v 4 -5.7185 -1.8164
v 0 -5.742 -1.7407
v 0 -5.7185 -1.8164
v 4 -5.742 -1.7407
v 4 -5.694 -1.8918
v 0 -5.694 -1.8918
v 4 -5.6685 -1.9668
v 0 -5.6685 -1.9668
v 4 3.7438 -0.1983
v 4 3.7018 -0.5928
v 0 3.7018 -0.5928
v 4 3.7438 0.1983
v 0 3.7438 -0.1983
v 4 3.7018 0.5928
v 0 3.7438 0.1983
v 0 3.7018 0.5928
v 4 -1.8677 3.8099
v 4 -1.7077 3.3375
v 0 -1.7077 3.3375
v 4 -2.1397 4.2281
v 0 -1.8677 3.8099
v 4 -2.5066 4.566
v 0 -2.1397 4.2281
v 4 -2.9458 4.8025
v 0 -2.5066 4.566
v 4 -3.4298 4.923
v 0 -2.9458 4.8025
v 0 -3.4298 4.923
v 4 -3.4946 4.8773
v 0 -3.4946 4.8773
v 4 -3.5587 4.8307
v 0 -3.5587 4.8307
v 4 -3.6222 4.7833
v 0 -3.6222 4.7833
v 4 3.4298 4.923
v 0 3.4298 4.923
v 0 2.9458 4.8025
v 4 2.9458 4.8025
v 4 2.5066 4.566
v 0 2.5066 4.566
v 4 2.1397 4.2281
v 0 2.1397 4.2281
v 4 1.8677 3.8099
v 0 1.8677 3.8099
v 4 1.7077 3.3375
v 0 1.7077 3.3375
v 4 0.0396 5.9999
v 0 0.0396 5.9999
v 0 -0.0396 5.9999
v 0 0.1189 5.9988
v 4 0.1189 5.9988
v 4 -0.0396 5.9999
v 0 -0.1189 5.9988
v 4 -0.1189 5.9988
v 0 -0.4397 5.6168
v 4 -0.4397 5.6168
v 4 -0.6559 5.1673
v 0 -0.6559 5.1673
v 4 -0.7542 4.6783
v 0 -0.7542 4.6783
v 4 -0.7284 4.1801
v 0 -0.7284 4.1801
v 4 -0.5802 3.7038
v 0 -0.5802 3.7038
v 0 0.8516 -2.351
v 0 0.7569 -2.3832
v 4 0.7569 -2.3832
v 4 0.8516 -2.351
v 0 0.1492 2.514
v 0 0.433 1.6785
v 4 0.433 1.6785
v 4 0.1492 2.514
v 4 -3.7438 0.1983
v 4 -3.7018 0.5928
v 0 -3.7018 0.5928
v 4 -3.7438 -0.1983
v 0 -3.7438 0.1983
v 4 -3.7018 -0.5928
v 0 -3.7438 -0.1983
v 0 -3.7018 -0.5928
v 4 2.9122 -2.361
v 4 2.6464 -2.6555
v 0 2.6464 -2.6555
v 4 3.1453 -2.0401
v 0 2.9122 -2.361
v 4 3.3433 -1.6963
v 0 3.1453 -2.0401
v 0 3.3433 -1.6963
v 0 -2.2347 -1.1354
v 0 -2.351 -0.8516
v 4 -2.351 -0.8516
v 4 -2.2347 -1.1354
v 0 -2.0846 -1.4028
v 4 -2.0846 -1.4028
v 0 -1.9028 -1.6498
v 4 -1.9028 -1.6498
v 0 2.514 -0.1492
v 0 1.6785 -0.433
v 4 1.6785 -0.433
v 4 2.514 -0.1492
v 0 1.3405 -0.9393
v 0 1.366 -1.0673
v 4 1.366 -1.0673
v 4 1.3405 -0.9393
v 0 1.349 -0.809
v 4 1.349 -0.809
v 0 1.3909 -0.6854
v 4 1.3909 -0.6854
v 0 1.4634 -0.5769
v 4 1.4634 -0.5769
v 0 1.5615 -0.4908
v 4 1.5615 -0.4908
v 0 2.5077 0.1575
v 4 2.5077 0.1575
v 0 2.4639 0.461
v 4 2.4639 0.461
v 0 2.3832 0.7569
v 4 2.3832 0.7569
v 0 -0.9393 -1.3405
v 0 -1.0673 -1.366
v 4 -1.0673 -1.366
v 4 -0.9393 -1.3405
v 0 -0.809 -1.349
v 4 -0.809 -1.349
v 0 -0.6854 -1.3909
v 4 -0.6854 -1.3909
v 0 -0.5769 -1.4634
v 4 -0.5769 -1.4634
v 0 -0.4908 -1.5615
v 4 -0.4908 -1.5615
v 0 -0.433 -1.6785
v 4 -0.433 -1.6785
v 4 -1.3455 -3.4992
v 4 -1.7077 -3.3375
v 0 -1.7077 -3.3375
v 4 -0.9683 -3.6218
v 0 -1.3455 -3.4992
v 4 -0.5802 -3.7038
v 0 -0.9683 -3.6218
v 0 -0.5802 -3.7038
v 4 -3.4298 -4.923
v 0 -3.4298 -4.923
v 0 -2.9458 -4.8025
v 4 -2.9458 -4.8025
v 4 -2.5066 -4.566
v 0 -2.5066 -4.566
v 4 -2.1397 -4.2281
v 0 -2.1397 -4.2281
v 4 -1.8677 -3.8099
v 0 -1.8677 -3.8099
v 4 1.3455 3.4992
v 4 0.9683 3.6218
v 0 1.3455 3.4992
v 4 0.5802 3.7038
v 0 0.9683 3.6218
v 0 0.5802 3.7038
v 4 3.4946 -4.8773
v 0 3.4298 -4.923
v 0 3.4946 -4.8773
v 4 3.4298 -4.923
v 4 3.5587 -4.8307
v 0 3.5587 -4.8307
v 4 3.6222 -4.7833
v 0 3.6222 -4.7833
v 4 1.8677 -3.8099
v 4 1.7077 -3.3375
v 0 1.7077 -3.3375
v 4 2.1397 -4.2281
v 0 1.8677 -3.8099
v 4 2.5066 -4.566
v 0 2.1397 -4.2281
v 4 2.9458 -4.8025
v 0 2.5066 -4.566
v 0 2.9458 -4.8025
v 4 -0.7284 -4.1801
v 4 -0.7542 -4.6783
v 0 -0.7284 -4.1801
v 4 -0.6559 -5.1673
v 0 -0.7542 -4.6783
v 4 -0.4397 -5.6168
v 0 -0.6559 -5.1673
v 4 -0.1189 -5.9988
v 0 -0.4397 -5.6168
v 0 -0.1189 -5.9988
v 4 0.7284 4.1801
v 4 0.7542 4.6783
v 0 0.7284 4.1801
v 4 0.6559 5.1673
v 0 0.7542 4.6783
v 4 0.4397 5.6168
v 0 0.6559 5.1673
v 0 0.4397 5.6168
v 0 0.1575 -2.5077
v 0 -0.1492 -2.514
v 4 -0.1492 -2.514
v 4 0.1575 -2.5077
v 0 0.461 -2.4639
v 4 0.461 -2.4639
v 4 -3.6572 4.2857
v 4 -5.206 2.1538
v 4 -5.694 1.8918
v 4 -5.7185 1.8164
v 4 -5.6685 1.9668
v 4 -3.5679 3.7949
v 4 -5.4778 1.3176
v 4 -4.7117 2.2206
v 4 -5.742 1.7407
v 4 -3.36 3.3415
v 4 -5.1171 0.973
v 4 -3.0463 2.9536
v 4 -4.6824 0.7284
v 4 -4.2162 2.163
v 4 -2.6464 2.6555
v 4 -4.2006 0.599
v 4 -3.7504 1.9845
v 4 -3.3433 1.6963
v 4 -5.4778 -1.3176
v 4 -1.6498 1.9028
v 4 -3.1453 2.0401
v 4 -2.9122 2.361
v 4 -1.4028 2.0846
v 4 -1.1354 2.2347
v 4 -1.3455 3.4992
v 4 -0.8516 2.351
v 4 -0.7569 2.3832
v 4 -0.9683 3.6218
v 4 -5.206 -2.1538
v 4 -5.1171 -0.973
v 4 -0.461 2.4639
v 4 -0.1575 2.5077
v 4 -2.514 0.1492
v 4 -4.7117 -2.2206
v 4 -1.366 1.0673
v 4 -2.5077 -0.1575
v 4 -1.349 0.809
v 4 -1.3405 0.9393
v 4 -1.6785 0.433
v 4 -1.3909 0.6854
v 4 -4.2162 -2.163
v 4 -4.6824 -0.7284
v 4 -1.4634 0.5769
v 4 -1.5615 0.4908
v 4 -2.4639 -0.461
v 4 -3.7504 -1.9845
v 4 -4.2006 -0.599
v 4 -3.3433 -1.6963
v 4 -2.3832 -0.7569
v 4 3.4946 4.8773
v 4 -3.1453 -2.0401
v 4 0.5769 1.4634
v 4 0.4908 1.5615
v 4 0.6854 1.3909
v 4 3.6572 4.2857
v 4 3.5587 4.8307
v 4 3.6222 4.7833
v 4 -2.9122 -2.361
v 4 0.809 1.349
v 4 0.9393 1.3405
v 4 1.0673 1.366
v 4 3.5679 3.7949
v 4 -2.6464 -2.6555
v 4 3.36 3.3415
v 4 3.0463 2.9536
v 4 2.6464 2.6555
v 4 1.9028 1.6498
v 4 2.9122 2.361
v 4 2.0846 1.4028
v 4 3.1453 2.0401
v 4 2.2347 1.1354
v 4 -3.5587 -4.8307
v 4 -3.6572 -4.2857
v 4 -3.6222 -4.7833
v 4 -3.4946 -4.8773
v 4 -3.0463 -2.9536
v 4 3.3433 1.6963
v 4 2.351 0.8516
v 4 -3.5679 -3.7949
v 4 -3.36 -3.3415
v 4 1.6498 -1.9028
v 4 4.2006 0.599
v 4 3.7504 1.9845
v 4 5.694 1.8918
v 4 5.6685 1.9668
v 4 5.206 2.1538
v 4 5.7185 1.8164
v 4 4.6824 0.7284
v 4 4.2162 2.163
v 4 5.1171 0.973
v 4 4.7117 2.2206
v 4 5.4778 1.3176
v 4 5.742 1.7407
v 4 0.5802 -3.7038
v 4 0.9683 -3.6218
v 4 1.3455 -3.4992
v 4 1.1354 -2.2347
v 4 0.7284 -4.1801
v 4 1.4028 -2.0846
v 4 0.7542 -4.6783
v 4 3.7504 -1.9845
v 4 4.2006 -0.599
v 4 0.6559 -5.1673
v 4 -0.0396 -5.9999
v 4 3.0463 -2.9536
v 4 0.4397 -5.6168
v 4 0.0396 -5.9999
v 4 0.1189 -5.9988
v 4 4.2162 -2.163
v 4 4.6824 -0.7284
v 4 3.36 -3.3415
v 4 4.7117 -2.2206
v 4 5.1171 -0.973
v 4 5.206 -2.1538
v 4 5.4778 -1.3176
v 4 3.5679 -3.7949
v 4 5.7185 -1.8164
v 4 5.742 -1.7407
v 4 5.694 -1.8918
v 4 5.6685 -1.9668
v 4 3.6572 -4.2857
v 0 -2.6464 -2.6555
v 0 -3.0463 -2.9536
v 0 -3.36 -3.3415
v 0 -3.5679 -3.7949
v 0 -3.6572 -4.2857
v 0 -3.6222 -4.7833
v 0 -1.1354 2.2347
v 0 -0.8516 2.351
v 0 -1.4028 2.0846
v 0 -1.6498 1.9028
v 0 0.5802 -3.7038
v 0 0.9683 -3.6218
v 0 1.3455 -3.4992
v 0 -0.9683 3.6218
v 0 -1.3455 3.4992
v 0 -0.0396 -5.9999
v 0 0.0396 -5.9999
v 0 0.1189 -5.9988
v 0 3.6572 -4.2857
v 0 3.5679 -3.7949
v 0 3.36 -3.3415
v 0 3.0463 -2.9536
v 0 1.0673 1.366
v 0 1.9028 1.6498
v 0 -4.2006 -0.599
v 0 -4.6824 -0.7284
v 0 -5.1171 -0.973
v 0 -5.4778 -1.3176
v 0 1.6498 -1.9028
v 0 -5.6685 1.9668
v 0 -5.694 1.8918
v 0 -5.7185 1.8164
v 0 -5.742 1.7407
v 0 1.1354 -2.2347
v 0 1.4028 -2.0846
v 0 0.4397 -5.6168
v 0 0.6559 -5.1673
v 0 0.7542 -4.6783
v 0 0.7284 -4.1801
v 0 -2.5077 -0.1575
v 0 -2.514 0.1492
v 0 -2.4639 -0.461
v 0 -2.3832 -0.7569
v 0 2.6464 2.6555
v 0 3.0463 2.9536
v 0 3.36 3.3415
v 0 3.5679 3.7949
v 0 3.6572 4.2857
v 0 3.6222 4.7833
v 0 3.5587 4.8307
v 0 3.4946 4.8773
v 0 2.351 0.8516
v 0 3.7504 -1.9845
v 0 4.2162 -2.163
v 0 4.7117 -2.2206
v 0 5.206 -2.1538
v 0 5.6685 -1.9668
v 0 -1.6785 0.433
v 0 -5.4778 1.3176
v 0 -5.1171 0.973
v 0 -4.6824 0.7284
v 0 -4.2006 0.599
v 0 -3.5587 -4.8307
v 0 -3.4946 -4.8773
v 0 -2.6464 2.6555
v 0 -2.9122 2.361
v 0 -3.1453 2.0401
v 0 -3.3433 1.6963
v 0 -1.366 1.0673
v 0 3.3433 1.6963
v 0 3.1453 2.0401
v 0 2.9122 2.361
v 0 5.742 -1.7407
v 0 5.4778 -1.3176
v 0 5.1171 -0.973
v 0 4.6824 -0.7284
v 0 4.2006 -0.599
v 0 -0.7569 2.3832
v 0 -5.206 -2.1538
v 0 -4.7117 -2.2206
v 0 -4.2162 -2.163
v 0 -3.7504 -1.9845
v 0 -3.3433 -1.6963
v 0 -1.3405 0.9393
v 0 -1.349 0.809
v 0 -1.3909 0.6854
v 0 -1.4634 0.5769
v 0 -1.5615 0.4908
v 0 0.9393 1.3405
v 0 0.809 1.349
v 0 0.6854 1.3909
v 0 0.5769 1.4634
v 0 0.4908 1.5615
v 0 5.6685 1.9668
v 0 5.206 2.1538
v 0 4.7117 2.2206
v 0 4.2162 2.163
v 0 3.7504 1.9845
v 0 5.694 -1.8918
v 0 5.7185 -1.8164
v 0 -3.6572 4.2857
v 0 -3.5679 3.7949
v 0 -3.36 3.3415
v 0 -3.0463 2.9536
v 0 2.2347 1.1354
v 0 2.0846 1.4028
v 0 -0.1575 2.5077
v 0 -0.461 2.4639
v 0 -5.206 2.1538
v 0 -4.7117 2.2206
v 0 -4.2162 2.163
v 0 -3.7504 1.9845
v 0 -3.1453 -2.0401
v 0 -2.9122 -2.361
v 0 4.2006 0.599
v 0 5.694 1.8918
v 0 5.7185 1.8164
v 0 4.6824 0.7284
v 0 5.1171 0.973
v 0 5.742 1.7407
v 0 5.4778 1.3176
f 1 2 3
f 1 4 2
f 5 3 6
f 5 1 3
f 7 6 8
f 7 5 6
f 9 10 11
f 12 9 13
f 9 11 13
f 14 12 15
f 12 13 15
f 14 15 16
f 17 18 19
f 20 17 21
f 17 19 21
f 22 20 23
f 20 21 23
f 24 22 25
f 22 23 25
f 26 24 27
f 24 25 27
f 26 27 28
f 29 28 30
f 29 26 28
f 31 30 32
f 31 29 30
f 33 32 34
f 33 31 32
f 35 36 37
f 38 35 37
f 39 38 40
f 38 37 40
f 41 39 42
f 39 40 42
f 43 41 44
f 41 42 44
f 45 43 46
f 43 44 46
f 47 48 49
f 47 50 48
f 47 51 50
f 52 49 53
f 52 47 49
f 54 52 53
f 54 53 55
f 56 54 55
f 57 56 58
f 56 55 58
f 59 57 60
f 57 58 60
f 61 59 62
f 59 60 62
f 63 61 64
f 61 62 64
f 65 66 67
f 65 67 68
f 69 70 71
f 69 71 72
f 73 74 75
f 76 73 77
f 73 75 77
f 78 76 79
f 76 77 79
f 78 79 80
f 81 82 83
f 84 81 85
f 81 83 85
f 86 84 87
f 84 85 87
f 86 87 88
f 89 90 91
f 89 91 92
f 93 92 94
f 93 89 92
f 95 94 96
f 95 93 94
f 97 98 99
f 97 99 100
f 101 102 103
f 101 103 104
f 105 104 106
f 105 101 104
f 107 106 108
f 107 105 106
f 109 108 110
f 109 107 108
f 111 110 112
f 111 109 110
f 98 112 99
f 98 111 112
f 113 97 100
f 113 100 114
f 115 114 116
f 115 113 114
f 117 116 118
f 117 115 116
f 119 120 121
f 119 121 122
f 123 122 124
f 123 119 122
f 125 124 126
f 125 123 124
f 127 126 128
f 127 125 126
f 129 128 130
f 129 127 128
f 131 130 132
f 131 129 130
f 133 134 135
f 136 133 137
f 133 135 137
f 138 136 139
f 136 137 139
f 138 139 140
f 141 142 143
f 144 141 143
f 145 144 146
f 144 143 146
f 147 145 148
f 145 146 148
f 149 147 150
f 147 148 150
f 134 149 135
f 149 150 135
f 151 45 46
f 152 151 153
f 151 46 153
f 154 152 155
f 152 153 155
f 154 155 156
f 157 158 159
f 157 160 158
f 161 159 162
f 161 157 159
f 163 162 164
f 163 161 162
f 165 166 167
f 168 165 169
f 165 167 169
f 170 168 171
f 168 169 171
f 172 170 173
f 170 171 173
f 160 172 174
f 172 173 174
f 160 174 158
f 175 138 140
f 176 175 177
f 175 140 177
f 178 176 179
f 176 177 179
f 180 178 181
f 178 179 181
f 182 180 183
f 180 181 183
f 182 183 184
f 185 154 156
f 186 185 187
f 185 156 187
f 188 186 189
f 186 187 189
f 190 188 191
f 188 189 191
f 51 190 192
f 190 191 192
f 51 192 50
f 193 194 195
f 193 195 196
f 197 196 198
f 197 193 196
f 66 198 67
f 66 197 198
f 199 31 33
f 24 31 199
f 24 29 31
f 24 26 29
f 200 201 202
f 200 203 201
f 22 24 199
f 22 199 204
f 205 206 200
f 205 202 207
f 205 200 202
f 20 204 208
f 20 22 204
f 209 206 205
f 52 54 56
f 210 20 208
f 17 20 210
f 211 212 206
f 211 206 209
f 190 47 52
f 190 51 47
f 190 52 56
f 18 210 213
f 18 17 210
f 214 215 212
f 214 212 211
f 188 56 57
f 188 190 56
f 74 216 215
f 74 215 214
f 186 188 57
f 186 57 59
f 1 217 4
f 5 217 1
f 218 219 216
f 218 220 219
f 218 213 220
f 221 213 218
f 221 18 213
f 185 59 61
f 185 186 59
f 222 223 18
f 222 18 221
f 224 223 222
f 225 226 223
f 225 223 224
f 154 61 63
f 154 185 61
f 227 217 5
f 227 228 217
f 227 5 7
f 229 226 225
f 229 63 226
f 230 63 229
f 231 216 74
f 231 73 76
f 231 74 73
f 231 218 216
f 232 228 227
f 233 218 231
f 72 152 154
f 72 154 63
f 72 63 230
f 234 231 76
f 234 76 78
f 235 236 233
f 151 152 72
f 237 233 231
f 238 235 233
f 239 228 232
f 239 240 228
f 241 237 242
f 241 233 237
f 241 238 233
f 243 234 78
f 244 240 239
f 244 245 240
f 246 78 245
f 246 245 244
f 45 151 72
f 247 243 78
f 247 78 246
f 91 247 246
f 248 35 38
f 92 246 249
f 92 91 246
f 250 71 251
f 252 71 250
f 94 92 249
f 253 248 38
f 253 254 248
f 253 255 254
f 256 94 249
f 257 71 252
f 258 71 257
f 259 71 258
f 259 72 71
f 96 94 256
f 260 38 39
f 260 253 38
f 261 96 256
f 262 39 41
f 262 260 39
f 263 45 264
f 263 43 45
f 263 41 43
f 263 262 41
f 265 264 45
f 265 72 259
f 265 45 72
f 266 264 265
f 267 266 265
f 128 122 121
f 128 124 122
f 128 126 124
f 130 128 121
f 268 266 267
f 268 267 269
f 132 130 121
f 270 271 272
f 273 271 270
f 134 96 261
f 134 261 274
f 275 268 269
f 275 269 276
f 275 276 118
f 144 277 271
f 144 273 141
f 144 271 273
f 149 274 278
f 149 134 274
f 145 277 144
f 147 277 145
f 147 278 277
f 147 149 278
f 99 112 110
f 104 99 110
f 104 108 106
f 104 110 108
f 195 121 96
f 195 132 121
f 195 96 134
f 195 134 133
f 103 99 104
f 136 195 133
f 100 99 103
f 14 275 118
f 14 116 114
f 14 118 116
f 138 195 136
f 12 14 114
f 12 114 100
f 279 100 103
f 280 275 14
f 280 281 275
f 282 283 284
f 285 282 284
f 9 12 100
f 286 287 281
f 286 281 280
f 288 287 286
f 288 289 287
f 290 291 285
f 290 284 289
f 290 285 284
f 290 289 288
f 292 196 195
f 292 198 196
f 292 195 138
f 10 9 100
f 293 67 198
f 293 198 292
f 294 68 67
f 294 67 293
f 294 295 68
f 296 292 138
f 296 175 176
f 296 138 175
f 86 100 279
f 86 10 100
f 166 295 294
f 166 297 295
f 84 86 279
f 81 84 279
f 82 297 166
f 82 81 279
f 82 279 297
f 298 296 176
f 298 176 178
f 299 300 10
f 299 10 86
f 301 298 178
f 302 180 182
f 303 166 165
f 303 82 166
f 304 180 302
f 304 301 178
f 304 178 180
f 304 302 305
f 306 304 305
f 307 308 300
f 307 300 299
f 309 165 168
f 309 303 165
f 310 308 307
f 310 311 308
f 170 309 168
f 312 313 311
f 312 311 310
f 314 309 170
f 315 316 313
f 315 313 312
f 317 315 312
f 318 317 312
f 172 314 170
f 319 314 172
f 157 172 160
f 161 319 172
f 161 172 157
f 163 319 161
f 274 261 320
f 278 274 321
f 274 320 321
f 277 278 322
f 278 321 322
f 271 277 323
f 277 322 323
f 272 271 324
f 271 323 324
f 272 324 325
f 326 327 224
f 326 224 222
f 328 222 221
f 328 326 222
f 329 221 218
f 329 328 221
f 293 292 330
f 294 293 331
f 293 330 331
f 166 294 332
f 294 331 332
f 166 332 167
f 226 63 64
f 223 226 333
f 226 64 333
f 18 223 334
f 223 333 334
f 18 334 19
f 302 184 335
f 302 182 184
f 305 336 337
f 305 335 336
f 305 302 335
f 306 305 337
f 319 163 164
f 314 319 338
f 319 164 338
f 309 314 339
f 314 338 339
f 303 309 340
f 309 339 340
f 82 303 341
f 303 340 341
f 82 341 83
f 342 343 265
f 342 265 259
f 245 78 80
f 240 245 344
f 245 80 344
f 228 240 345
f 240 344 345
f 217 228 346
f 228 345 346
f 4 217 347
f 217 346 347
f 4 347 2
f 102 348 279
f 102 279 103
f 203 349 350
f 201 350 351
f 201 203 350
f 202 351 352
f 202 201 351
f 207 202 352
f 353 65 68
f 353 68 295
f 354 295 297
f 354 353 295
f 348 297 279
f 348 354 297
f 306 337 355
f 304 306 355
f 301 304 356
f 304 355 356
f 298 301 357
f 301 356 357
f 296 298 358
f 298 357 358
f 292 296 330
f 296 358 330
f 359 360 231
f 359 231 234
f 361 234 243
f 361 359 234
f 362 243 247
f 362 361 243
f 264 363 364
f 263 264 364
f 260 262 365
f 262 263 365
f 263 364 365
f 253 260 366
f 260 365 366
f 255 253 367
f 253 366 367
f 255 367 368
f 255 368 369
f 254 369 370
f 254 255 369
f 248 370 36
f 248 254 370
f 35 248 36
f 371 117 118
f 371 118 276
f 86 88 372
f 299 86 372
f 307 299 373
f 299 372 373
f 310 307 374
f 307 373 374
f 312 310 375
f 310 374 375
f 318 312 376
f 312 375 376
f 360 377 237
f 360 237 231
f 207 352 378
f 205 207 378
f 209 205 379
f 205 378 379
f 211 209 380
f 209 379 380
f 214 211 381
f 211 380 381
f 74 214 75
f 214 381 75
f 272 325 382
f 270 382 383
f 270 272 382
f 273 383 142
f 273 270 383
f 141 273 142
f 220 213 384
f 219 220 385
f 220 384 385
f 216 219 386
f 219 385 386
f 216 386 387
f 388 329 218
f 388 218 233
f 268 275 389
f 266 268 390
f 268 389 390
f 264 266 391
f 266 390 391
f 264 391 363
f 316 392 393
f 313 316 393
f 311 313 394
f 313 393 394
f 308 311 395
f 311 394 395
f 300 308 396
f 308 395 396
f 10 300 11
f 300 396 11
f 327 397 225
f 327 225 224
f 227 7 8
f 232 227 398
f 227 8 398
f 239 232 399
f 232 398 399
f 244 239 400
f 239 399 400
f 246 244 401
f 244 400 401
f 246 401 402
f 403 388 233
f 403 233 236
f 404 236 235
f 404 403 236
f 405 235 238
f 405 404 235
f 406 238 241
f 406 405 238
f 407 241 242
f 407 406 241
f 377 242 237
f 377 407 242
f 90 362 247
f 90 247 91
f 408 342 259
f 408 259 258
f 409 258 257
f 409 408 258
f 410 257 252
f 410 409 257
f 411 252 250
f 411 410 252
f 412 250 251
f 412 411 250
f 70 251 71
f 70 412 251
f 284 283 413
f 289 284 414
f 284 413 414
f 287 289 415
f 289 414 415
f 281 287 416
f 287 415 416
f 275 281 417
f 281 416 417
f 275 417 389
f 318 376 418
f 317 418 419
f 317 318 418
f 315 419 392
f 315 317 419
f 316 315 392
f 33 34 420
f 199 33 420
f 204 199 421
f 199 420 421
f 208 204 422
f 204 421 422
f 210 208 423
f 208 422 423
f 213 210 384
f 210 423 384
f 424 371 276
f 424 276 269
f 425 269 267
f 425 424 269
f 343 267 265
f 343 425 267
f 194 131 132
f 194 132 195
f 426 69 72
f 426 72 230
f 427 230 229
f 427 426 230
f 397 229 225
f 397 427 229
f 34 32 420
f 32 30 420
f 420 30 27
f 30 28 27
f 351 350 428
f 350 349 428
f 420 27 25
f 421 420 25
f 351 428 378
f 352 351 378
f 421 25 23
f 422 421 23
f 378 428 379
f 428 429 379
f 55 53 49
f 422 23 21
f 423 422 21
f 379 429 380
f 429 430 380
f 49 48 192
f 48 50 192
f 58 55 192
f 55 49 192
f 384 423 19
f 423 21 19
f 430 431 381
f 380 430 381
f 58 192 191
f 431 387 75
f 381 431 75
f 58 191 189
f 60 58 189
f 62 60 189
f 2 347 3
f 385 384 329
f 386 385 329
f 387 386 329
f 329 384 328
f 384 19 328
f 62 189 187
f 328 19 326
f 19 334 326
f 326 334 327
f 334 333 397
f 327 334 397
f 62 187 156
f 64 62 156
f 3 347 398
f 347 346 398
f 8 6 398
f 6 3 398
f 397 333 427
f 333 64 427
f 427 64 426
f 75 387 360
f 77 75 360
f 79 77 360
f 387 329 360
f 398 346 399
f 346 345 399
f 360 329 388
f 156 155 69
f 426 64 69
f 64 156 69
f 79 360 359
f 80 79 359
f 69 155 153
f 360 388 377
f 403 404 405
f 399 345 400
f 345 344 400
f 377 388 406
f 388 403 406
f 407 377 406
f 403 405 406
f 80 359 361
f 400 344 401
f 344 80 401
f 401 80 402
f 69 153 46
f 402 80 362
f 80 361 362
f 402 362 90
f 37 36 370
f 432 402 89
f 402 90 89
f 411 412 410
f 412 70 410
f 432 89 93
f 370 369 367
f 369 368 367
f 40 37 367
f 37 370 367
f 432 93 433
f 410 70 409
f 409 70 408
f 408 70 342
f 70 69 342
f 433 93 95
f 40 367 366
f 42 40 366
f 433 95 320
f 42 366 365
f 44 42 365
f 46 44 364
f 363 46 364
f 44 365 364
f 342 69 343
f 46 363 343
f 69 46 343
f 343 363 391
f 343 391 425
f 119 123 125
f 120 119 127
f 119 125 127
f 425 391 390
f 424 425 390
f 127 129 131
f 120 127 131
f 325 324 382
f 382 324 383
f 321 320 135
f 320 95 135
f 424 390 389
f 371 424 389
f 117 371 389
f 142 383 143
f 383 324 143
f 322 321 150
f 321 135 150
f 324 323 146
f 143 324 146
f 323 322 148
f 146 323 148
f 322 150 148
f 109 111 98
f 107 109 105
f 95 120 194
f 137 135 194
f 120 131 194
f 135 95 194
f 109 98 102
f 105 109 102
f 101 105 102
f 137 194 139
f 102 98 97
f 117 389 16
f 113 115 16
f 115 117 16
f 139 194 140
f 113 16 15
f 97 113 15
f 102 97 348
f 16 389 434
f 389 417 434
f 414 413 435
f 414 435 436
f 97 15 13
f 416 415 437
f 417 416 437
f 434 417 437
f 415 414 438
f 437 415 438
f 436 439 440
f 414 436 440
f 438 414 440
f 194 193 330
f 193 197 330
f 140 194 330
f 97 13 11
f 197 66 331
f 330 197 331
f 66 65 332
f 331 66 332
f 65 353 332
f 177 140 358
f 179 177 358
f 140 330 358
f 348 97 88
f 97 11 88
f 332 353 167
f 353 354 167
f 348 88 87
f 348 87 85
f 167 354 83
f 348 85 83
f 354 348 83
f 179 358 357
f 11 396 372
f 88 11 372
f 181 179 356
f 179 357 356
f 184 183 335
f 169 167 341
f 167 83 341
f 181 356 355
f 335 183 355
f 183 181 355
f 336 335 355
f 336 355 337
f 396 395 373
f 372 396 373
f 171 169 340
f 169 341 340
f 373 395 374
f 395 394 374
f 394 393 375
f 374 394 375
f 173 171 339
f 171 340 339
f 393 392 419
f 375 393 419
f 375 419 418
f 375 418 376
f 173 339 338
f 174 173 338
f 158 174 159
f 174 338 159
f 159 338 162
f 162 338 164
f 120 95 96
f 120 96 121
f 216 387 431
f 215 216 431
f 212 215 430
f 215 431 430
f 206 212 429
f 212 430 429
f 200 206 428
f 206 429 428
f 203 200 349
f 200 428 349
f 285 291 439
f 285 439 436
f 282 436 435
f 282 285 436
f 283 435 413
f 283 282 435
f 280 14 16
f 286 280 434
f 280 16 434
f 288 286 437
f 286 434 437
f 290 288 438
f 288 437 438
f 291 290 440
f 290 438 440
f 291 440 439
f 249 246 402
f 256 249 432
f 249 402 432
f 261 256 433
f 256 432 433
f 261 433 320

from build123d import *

# Parameters (mm, degrees)
BASPROSKE_W         = 4
BASPROSKE_H         = 6
TOOTHCUT_DEPTH      = 10.38083152
TEETHCUTS_COUNT     = 10
TEETHCUTS_ANGLE     = 324
BORSKE_R            = 2.5
BORE_DEPTH          = 50.0000508
SKETCH2_R           = 3
CUT_EXTRUDE1_DEPTH  = 10.217922092
BOSS_EXTRUDE1_START = -4
SKETCH1_R           = 3
BOSS_EXTRUDE1_DEPTH = 4


with BuildPart() as part:
    # BasProSke → Base-Revolve (revolve)
    with BuildSketch(Plane(origin=(0, 0, 0), x_dir=(1, 0, 0), z_dir=(0, 1, 0)), mode=Mode.PRIVATE) as base_revolve_sk:
        with Locations((2, 3)):
            Rectangle(BASPROSKE_W, BASPROSKE_H)
    revolve(base_revolve_sk.sketch.rotate(Axis((-10, 0, 0), (1, 0, 0)), 180), axis=Axis((-10, 0, 0), (1, 0, 0)))

    # TooCutSke → ToothCut (cut, through all)
    with BuildSketch(Plane(origin=(0, 0, 0), x_dir=(0, 0, -1), z_dir=(1, 0, 0))):
        with BuildLine():
            ThreePointArc((0.59278292, 3.701838653), (0, 3.749), (-0.59278292, 3.701838653))
            ThreePointArc((-0.59278292, 3.701838653), (-0.846593509, 4.924114224), (-1.775771316, 5.757784417))
            ThreePointArc((-1.775771316, 5.757784417), (0, 6.0254), (1.775771316, 5.757784417))
            ThreePointArc((1.775771316, 5.757784417), (0.846593509, 4.924114224), (0.59278292, 3.701838653))
        make_face()
    toothcut = extrude(amount=TOOTHCUT_DEPTH, mode=Mode.SUBTRACT)

    # TeethCuts: ToothCut ×10 about axis
    teethcuts_axis = Axis((-10, 0, 0), (1, 0, 0))
    for i in range(1, TEETHCUTS_COUNT):
        add(toothcut.rotate(teethcuts_axis, i * TEETHCUTS_ANGLE / (TEETHCUTS_COUNT - 1)), mode=Mode.SUBTRACT)

    # BorSke → Bore (cut, symmetric)
    with BuildSketch(Plane(origin=(0, 0, 0), x_dir=(0, 0, -1), z_dir=(1, 0, 0))):
        with Locations(Location((0, 0, 0), (0, 0, 180))):
            Circle(BORSKE_R)
    extrude(amount=BORE_DEPTH, both=True, mode=Mode.SUBTRACT)

    # Sketch2 → Cut-Extrude1 (cut, through all)
    with BuildSketch(Plane.ZY):
        Circle(SKETCH2_R)
    extrude(amount=-CUT_EXTRUDE1_DEPTH, mode=Mode.SUBTRACT)

    # Sketch1 → Boss-Extrude1 (add)
    with BuildSketch(Plane(origin=(4, 0, 0), x_dir=(0, 0, -1), z_dir=(1, 0, 0)).offset(BOSS_EXTRUDE1_START)):
        Circle(SKETCH1_R)
        with BuildLine():
            Line((-0.433026392, -1.678537501), (-0.149160433, -2.514010972))
            ThreePointArc((-0.149160433, -2.514010972), (0.309918975, -2.490426475), (0.756919525, -2.383185438))
            Line((0.756919525, -2.383185438), (0.851603533, -2.351014977))
            ThreePointArc((0.851603533, -2.351014977), (1.271412306, -2.163743179), (1.649835725, -1.902772209))
            Line((1.649835725, -1.902772209), (1.365969766, -1.067298739))
            ThreePointArc((1.365969766, -1.067298739), (1.390891529, -0.685427668), (1.678537501, -0.433026392))
            Line((1.678537501, -0.433026392), (2.514010972, -0.149160433))
            ThreePointArc((2.514010972, -0.149160433), (2.490426475, 0.309918975), (2.383185438, 0.756919525))
            Line((2.383185438, 0.756919525), (2.351014977, 0.851603533))
            ThreePointArc((2.351014977, 0.851603533), (2.163743179, 1.271412306), (1.902772209, 1.649835725))
            Line((1.902772209, 1.649835725), (1.067298739, 1.365969766))
            ThreePointArc((1.067298739, 1.365969766), (0.685427668, 1.390891529), (0.433026392, 1.678537501))
            Line((0.433026392, 1.678537501), (0.149160433, 2.514010972))
            ThreePointArc((0.149160433, 2.514010972), (-0.309918975, 2.490426475), (-0.756919525, 2.383185438))
            Line((-0.756919525, 2.383185438), (-0.851603533, 2.351014977))
            ThreePointArc((-0.851603533, 2.351014977), (-1.271412306, 2.163743179), (-1.649835725, 1.902772209))
            Line((-1.649835725, 1.902772209), (-1.365969766, 1.067298739))
            ThreePointArc((-1.365969766, 1.067298739), (-1.390891529, 0.685427668), (-1.678537501, 0.433026392))
            Line((-1.678537501, 0.433026392), (-2.514010972, 0.149160433))
            ThreePointArc((-2.514010972, 0.149160433), (-2.490426475, -0.309918975), (-2.383185438, -0.756919525))
            Line((-2.383185438, -0.756919525), (-2.351014977, -0.851603533))
            ThreePointArc((-2.351014977, -0.851603533), (-2.163743179, -1.271412306), (-1.902772209, -1.649835725))
            Line((-1.902772209, -1.649835725), (-1.067298739, -1.365969766))
            ThreePointArc((-1.067298739, -1.365969766), (-0.685427668, -1.390891529), (-0.433026392, -1.678537501))
        make_face(mode=Mode.SUBTRACT)
    extrude(amount=BOSS_EXTRUDE1_DEPTH)


solid = part.part
